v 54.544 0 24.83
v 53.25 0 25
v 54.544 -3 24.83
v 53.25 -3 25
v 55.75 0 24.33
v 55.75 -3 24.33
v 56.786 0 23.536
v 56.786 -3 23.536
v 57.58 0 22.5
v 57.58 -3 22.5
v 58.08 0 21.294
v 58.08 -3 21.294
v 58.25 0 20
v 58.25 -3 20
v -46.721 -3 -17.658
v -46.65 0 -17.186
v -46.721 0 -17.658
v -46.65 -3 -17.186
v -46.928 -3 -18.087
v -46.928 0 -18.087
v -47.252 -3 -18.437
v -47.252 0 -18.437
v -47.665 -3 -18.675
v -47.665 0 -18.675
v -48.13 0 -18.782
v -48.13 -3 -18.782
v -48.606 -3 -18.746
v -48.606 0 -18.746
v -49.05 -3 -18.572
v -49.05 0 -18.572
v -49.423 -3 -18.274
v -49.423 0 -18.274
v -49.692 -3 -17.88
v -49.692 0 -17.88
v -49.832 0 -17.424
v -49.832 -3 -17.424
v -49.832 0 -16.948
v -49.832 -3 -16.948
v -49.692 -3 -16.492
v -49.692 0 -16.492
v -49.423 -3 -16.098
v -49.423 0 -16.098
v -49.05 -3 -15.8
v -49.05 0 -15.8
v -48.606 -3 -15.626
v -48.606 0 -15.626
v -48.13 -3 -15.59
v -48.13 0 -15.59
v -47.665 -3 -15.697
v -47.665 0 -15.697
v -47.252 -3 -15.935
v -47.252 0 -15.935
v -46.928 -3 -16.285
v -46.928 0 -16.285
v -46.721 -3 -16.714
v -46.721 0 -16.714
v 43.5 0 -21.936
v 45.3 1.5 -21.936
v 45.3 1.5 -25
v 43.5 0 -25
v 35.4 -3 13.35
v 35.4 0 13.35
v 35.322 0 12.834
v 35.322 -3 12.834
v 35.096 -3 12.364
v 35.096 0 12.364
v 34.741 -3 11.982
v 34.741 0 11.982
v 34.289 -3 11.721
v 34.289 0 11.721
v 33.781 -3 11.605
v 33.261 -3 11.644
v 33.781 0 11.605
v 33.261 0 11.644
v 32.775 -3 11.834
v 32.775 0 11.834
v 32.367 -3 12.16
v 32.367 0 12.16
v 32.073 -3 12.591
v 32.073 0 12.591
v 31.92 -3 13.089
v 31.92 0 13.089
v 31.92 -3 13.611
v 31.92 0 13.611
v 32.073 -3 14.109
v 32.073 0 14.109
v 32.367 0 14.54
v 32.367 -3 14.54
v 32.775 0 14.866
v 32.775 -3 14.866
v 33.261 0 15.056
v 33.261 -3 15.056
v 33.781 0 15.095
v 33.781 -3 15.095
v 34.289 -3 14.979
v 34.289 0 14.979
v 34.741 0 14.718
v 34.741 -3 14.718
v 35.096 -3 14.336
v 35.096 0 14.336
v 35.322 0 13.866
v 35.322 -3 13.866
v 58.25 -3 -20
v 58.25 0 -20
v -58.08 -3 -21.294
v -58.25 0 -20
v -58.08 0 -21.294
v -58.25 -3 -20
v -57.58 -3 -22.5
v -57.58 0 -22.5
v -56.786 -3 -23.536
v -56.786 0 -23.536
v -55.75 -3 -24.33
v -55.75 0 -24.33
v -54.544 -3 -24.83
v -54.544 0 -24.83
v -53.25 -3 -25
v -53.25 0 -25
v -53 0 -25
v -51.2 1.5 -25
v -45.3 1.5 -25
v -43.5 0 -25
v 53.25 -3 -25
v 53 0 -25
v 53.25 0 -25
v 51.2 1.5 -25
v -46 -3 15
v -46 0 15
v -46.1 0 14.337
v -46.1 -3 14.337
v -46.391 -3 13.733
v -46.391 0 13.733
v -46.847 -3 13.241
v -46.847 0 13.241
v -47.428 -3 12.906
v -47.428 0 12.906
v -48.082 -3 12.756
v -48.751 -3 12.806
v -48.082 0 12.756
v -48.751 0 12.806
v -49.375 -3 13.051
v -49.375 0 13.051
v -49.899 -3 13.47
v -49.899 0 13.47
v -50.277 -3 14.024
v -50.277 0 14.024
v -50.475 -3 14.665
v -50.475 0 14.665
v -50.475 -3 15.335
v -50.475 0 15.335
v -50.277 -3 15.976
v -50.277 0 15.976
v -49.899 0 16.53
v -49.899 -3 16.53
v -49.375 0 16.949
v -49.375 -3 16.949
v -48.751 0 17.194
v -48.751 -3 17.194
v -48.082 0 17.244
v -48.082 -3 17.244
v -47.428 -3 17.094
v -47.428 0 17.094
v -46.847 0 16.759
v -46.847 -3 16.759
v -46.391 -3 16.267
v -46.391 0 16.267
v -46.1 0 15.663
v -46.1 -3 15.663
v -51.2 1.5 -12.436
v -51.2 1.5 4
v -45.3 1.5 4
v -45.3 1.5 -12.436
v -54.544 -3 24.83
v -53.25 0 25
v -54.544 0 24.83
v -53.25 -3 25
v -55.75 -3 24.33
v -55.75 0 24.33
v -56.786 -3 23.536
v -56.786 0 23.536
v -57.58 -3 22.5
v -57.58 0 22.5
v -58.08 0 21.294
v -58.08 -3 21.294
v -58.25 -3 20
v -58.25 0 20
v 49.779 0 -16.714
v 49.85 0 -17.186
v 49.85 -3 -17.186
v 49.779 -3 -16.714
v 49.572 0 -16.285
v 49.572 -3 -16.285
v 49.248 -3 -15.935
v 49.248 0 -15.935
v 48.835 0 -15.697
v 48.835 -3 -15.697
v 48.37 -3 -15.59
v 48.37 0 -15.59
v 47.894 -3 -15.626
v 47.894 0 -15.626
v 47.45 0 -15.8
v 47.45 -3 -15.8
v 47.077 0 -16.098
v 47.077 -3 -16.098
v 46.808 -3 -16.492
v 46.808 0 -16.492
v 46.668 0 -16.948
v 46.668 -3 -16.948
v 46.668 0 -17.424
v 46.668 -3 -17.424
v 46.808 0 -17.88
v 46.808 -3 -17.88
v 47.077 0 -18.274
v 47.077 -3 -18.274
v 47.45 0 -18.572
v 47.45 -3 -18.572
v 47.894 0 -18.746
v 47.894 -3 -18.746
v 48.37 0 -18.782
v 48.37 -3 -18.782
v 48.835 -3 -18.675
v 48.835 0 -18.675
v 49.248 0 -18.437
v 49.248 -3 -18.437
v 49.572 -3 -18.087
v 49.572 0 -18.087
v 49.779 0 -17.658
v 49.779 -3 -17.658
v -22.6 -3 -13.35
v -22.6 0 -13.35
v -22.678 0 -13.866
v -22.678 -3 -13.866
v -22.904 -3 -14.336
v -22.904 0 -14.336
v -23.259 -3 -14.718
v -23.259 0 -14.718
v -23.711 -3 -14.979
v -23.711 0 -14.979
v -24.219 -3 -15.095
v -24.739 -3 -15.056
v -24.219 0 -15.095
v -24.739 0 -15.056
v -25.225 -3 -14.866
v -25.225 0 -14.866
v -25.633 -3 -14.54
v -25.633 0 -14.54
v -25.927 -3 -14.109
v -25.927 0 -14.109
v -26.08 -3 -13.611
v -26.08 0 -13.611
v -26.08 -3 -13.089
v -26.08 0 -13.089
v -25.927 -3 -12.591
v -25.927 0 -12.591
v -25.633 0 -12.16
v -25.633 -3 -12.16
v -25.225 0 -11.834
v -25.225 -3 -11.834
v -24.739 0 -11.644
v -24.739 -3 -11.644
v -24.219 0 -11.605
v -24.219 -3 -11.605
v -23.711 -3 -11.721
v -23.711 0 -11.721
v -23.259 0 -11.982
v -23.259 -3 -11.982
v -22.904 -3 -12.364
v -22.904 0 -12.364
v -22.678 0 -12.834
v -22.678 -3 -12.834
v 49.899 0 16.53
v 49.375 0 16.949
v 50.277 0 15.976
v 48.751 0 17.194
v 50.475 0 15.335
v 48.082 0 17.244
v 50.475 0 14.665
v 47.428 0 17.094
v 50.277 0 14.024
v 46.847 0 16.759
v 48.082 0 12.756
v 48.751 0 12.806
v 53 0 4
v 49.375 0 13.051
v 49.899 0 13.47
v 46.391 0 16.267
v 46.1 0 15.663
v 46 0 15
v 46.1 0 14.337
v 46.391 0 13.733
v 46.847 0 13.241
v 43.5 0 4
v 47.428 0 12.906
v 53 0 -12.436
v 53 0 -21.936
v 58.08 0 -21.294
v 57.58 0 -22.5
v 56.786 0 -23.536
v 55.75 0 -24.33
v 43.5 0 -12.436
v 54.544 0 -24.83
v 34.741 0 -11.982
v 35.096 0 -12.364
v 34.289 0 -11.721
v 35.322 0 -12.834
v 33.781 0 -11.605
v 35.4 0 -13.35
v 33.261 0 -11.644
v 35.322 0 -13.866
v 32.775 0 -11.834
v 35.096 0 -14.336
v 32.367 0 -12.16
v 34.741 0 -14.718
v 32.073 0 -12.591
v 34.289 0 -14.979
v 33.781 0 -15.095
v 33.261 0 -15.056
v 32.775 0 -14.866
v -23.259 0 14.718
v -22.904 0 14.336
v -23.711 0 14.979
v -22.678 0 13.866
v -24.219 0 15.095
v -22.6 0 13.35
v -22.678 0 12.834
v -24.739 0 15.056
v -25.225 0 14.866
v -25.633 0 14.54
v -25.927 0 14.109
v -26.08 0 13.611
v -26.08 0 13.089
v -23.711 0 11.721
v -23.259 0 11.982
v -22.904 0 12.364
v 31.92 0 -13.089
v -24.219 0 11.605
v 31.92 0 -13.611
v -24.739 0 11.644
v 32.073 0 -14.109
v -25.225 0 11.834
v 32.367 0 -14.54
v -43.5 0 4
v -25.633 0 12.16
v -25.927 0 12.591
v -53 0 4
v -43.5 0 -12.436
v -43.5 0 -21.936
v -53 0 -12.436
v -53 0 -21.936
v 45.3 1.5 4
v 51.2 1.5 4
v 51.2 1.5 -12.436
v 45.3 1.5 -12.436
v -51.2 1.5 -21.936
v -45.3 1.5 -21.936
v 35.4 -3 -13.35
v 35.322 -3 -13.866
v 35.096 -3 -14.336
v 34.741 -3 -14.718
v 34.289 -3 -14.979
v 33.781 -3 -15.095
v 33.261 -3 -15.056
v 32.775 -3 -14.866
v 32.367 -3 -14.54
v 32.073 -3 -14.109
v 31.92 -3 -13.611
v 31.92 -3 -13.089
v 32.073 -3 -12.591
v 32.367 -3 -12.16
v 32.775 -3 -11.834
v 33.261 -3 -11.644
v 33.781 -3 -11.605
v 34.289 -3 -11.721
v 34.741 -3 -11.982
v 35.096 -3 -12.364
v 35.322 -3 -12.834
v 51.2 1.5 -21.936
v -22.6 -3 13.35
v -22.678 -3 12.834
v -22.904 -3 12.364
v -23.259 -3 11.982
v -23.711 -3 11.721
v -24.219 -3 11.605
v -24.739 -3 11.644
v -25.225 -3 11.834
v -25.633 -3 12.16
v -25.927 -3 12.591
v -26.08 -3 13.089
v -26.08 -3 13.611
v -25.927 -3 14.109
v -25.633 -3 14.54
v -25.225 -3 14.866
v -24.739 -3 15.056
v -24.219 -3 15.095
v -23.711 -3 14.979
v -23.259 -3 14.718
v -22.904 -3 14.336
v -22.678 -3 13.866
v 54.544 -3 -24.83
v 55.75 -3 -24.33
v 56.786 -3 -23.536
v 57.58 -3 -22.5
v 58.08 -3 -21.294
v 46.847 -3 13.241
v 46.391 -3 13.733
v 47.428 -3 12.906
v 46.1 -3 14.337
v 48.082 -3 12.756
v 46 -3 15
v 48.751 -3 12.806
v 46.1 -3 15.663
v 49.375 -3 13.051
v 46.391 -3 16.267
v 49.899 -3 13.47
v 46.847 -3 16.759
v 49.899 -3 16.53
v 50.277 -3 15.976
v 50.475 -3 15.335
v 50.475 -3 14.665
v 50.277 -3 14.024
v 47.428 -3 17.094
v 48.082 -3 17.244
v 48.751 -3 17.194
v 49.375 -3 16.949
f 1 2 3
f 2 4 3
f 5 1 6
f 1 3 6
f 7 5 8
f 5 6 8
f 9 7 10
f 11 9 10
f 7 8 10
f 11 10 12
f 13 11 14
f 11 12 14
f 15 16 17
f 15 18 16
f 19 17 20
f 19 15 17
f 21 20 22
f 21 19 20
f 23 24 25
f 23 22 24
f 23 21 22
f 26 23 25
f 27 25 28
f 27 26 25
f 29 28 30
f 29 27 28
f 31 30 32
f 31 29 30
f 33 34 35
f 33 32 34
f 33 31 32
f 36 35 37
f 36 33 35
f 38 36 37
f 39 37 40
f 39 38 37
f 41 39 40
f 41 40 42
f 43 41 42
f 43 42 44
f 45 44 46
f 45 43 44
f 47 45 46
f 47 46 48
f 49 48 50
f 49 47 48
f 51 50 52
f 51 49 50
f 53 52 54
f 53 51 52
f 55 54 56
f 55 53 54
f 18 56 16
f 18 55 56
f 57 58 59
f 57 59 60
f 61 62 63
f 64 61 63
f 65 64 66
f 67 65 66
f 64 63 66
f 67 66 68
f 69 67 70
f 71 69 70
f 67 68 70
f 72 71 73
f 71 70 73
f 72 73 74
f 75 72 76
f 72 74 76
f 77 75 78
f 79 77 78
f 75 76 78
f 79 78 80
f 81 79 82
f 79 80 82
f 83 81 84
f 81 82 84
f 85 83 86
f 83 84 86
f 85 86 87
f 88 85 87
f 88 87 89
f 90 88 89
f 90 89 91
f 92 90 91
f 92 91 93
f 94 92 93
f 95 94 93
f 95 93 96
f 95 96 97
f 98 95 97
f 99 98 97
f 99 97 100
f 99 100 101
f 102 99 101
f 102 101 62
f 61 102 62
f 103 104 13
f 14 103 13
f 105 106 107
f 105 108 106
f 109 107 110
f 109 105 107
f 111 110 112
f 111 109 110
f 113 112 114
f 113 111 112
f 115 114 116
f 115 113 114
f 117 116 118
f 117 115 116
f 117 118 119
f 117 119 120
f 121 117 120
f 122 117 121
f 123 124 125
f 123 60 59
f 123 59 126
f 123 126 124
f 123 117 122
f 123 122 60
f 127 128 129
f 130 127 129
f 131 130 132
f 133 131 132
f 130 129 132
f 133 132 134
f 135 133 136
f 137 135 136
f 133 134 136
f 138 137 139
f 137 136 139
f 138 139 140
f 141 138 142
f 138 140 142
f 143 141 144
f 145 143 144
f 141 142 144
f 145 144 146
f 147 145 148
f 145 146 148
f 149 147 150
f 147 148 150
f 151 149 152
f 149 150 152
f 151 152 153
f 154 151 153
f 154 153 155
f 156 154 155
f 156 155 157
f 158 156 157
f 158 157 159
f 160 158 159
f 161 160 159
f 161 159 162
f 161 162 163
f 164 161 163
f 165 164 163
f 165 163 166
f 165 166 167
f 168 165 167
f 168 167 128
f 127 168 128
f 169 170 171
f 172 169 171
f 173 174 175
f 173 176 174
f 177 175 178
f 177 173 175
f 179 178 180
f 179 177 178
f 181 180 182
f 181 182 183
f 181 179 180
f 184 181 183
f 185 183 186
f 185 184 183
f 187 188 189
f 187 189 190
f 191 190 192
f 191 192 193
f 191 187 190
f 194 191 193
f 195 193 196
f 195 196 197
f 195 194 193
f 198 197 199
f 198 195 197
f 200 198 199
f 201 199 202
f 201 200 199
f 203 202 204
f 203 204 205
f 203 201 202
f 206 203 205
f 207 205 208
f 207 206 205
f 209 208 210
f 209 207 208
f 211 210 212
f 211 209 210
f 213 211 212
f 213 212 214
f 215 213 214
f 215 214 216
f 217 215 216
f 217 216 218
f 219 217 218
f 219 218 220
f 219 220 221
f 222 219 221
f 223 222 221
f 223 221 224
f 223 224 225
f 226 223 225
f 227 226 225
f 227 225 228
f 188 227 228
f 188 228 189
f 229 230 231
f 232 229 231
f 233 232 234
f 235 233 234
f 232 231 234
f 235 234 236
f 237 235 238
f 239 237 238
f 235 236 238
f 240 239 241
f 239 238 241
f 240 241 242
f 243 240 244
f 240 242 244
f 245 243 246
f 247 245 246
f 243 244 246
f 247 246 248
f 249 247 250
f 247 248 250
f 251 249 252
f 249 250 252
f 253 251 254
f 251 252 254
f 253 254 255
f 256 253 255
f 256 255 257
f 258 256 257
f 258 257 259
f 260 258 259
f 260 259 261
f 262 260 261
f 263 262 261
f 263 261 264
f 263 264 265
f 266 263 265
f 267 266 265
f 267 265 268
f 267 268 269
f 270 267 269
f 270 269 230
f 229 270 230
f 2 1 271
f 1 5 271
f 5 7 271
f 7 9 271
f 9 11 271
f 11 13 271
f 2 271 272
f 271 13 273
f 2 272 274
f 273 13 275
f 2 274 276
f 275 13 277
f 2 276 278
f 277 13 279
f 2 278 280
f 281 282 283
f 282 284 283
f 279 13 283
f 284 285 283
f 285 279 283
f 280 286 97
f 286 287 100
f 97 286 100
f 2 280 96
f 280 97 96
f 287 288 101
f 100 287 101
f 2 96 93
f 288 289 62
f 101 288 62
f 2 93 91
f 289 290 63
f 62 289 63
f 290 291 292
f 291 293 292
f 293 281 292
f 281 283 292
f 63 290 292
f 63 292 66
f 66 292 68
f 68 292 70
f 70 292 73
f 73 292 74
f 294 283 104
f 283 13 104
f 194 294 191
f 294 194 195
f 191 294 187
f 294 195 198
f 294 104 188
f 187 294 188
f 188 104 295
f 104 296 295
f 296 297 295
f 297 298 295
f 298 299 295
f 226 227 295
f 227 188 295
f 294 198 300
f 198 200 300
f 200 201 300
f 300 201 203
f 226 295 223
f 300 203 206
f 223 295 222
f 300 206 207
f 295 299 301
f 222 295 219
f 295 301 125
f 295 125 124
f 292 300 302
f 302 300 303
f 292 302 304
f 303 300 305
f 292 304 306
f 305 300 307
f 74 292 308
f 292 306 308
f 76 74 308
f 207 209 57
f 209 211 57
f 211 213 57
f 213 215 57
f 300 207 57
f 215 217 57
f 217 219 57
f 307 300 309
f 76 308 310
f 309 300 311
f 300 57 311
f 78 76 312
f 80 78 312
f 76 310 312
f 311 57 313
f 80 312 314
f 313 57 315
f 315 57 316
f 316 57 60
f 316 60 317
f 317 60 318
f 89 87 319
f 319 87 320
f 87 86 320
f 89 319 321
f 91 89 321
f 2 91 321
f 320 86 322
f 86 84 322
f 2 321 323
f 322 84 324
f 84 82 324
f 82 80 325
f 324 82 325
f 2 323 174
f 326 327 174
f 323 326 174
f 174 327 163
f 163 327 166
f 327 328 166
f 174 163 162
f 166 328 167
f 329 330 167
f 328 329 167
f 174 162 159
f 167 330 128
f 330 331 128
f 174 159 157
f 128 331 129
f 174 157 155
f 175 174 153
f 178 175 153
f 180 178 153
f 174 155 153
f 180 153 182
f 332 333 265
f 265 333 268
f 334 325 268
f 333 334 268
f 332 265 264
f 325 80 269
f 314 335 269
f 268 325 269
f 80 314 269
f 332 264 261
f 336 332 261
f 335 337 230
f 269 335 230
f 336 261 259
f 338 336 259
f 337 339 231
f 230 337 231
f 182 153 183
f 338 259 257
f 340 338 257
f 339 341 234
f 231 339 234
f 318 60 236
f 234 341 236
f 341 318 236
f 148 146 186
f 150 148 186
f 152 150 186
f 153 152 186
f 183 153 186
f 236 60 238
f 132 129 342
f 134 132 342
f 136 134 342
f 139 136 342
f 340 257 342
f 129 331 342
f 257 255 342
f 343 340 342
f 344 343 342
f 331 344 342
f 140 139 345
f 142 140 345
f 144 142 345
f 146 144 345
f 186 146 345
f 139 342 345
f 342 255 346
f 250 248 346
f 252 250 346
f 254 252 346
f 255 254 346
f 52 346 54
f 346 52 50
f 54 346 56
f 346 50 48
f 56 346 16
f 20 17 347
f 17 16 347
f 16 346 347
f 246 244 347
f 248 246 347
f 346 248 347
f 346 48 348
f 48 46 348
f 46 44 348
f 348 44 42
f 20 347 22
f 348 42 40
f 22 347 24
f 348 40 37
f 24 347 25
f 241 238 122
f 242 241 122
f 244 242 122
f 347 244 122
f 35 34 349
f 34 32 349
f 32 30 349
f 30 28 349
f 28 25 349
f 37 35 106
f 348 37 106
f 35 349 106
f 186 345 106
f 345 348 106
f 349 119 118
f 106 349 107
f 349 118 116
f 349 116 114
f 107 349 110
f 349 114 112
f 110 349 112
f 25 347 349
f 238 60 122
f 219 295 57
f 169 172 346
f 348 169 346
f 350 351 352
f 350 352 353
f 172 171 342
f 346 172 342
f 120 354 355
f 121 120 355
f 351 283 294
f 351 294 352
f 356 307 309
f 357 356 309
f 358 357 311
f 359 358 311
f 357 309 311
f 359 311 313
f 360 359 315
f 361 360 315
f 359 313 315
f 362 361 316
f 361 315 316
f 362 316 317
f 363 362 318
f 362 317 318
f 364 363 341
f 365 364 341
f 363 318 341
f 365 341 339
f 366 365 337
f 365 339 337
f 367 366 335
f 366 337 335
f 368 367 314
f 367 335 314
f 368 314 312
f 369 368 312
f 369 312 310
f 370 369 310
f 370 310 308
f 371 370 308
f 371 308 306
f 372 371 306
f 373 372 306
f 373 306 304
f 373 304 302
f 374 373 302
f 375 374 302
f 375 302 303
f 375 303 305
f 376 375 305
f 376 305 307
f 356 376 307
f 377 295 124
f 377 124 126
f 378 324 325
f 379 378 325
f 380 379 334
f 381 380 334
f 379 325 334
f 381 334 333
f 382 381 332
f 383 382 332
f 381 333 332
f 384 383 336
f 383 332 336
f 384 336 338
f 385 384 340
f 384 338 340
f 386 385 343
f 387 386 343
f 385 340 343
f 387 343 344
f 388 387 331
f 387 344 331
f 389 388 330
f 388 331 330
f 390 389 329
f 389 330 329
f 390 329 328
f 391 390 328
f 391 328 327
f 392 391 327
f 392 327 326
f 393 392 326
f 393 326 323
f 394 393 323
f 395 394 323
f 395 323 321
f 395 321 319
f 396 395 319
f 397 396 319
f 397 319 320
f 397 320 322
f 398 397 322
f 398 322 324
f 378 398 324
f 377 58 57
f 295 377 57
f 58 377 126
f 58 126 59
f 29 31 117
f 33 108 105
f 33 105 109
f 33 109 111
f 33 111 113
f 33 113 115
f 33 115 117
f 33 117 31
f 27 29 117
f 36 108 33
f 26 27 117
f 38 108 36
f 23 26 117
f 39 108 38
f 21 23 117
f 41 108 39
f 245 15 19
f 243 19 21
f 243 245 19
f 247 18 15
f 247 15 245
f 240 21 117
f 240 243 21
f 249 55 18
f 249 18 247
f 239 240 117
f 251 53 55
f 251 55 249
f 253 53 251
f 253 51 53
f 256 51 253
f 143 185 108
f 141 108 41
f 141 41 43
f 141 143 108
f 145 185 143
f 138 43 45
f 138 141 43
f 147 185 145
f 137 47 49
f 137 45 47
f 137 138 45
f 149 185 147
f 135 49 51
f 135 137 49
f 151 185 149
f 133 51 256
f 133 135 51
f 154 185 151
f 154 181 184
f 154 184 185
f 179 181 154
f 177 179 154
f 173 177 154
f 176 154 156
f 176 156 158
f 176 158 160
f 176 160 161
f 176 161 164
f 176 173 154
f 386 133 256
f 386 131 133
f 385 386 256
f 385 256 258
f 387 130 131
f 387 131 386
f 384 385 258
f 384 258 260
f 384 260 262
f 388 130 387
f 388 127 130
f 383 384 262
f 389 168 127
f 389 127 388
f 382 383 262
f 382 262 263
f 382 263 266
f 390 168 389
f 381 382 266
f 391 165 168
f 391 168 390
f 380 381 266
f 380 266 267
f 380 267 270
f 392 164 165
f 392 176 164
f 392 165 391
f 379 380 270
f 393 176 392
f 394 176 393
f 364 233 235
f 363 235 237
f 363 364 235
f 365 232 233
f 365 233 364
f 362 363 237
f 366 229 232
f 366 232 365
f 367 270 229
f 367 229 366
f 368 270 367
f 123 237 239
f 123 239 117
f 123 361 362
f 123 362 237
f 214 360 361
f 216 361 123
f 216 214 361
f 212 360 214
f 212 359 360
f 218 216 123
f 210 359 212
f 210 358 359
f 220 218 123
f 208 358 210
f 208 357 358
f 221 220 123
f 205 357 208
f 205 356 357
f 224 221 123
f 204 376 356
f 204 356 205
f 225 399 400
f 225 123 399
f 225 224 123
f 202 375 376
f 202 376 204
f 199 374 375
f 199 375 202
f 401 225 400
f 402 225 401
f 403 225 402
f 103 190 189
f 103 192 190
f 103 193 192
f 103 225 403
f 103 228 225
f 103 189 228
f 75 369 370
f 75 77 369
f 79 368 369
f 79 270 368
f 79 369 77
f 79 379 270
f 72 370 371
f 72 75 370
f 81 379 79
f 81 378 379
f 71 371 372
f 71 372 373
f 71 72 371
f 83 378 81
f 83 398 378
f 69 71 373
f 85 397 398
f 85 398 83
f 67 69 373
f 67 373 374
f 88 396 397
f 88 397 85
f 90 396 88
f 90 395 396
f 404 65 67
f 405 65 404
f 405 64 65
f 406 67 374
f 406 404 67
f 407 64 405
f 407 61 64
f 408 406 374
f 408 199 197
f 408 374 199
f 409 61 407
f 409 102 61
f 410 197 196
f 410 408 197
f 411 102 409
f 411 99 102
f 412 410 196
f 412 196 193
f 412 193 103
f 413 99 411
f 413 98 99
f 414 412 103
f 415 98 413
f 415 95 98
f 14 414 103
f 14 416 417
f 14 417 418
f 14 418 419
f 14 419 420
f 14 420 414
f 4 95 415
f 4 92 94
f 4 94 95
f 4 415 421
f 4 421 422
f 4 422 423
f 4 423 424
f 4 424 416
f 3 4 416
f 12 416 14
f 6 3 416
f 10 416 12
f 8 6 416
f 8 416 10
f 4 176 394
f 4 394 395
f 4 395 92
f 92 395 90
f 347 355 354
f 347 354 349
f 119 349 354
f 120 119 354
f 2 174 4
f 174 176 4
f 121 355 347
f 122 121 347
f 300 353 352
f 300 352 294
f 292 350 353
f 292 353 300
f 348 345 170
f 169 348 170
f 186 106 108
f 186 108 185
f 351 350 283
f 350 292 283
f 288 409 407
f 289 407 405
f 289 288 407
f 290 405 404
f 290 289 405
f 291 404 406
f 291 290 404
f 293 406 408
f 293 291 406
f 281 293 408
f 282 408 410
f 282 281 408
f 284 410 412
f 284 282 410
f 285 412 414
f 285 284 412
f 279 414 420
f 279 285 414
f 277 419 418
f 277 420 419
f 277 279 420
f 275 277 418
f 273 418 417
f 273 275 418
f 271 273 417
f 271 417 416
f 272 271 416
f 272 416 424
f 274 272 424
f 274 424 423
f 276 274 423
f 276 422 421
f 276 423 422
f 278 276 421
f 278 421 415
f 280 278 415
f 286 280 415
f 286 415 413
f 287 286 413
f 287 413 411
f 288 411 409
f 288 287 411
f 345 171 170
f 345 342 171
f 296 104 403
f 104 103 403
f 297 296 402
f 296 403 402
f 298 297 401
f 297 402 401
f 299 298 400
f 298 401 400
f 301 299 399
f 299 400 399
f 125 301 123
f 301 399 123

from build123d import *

# Parameters (mm, degrees)
SKETCH_W        = 116.5
SKETCH_H        = 50
SKETCH_R        = 1.6
PAD_DEPTH       = 3
PAD001_DEPTH    = 50
PAD001_FACE18_R = 1.6
POCKET_DEPTH    = 255.213436
SKETCH002_W     = 9.5
SKETCH002_H     = 9.5
POCKET001_DEPTH = 1.5
SKETCH003_R     = 1.75
POCKET002_DEPTH = 5
POCKET003_DEPTH = 21
SKETCH004_R     = 1.6
PAD002_DEPTH    = 3
SKETCH005_R     = 2.25
POCKET004_DEPTH = 256.713436
FILLET_R        = 5


with BuildPart() as part:
    # Sketch → Pad (new body)
    with BuildSketch(Plane.XZ):
        Rectangle(SKETCH_W, SKETCH_H)
        with Locations((-48.25, 17.186)):
            Circle(SKETCH_R, mode=Mode.SUBTRACT)
        with Locations((-48.25, -17.186)):
            Circle(SKETCH_R, mode=Mode.SUBTRACT)
        with Locations((48.25, -17.186)):
            Circle(SKETCH_R, mode=Mode.SUBTRACT)
        with Locations((48.25, 17.186)):
            Circle(SKETCH_R, mode=Mode.SUBTRACT)
    extrude(amount=PAD_DEPTH)

    # Sketch001 (on Face1 of Pad) → Pad001 (join)
    with BuildSketch(Plane(origin=(0, 0, 25), x_dir=(-1, 0, 0), z_dir=(0, 0, 1))):
        Polygon((-51.2, -1.5), (-45.3, -1.5), (-43.5, 0), (-53, 0), align=None)
    pad001 = extrude(amount=-PAD001_DEPTH)

    # Pad001 Face18 → Pocket (cut, through all)
    with BuildSketch(Plane(origin=(48.25, 0, -17.186), x_dir=(-1, 0, 0), z_dir=(0, -1, 0))):
        Circle(PAD001_FACE18_R)
    pocket = extrude(amount=-POCKET_DEPTH, mode=Mode.SUBTRACT)

    # Sketch002 (on Face12 of Pocket) → Pocket001 (cut)
    with BuildSketch(Plane(origin=(0, 1.5, 0), x_dir=(1, 0, 0), z_dir=(0, 1, 0))):
        with Locations((48.25, 17.186)):
            Rectangle(SKETCH002_W, SKETCH002_H)
        with Locations((48.25, -17.186)):
            Rectangle(SKETCH002_W, SKETCH002_H)
    pocket001 = extrude(amount=-POCKET001_DEPTH, mode=Mode.SUBTRACT)

    # Mirrored: Pad001, Pocket, Pocket001 across YZ
    add(pad001.mirror(Plane.YZ))
    add(pocket.mirror(Plane.YZ), mode=Mode.SUBTRACT)
    add(pocket001.mirror(Plane.YZ), mode=Mode.SUBTRACT)

    # Sketch003 (on Face6 of Mirrored) → Pocket002 (cut)
    with BuildSketch(Plane(origin=(0, 0, 0), x_dir=(1, 0, 0), z_dir=(0, 1, 0))):
        with Locations((-24.35, -13.35)):
            Circle(SKETCH003_R)
        with Locations((33.65, -13.35)):
            Circle(SKETCH003_R)
        with Locations((33.65, 13.35)):
            Circle(SKETCH003_R)
        with Locations((-24.35, 13.35)):
            Circle(SKETCH003_R)
    extrude(amount=-POCKET002_DEPTH, mode=Mode.SUBTRACT)

    # Pocket002 Face5 → Pocket003 (cut)
    with BuildSketch(Plane(origin=(-48.25, 0.691558, 25), x_dir=(0, 1, 0), z_dir=(0, 0, 1))):
        Polygon((0.808442, -2.95), (0.808442, 2.95), (-0.691558, 4.75), (-0.691558, -4.75), align=None)
    pocket003 = extrude(amount=-POCKET003_DEPTH, mode=Mode.SUBTRACT)

    # Sketch004 (on Face11 of Pocket003) → Pad002 (join)
    with BuildSketch(Plane(origin=(0, 0, 0), x_dir=(1, 0, 0), z_dir=(0, 1, 0))):
        with Locations((-48.25, -17.186)):
            Circle(SKETCH004_R)
    pad002 = extrude(amount=-PAD002_DEPTH)

    # Sketch005 (on Face6 of Pad002) → Pocket004 (cut, through all)
    with BuildSketch(Plane(origin=(0, 0, 0), x_dir=(1, 0, 0), z_dir=(0, 1, 0))):
        with Locations((-48.25, -15)):
            Circle(SKETCH005_R)
    pocket004 = extrude(amount=-POCKET004_DEPTH, mode=Mode.SUBTRACT)

    # Mirrored001: Pocket003, Pad002, Pocket004 across YZ
    add(pocket003.mirror(Plane.YZ), mode=Mode.SUBTRACT)
    add(pad002.mirror(Plane.YZ))
    add(pocket004.mirror(Plane.YZ), mode=Mode.SUBTRACT)

    # Fillet
    fillet_edges = [part.edges().sort_by_distance(p)[0] for p in [
        (58.25, -1.5, 25),
        (58.25, -1.5, -25),
        (-58.25, -1.5, 25),
        (-58.25, -1.5, -25),
    ]]
    fillet(fillet_edges, radius=FILLET_R)


solid = part.part
